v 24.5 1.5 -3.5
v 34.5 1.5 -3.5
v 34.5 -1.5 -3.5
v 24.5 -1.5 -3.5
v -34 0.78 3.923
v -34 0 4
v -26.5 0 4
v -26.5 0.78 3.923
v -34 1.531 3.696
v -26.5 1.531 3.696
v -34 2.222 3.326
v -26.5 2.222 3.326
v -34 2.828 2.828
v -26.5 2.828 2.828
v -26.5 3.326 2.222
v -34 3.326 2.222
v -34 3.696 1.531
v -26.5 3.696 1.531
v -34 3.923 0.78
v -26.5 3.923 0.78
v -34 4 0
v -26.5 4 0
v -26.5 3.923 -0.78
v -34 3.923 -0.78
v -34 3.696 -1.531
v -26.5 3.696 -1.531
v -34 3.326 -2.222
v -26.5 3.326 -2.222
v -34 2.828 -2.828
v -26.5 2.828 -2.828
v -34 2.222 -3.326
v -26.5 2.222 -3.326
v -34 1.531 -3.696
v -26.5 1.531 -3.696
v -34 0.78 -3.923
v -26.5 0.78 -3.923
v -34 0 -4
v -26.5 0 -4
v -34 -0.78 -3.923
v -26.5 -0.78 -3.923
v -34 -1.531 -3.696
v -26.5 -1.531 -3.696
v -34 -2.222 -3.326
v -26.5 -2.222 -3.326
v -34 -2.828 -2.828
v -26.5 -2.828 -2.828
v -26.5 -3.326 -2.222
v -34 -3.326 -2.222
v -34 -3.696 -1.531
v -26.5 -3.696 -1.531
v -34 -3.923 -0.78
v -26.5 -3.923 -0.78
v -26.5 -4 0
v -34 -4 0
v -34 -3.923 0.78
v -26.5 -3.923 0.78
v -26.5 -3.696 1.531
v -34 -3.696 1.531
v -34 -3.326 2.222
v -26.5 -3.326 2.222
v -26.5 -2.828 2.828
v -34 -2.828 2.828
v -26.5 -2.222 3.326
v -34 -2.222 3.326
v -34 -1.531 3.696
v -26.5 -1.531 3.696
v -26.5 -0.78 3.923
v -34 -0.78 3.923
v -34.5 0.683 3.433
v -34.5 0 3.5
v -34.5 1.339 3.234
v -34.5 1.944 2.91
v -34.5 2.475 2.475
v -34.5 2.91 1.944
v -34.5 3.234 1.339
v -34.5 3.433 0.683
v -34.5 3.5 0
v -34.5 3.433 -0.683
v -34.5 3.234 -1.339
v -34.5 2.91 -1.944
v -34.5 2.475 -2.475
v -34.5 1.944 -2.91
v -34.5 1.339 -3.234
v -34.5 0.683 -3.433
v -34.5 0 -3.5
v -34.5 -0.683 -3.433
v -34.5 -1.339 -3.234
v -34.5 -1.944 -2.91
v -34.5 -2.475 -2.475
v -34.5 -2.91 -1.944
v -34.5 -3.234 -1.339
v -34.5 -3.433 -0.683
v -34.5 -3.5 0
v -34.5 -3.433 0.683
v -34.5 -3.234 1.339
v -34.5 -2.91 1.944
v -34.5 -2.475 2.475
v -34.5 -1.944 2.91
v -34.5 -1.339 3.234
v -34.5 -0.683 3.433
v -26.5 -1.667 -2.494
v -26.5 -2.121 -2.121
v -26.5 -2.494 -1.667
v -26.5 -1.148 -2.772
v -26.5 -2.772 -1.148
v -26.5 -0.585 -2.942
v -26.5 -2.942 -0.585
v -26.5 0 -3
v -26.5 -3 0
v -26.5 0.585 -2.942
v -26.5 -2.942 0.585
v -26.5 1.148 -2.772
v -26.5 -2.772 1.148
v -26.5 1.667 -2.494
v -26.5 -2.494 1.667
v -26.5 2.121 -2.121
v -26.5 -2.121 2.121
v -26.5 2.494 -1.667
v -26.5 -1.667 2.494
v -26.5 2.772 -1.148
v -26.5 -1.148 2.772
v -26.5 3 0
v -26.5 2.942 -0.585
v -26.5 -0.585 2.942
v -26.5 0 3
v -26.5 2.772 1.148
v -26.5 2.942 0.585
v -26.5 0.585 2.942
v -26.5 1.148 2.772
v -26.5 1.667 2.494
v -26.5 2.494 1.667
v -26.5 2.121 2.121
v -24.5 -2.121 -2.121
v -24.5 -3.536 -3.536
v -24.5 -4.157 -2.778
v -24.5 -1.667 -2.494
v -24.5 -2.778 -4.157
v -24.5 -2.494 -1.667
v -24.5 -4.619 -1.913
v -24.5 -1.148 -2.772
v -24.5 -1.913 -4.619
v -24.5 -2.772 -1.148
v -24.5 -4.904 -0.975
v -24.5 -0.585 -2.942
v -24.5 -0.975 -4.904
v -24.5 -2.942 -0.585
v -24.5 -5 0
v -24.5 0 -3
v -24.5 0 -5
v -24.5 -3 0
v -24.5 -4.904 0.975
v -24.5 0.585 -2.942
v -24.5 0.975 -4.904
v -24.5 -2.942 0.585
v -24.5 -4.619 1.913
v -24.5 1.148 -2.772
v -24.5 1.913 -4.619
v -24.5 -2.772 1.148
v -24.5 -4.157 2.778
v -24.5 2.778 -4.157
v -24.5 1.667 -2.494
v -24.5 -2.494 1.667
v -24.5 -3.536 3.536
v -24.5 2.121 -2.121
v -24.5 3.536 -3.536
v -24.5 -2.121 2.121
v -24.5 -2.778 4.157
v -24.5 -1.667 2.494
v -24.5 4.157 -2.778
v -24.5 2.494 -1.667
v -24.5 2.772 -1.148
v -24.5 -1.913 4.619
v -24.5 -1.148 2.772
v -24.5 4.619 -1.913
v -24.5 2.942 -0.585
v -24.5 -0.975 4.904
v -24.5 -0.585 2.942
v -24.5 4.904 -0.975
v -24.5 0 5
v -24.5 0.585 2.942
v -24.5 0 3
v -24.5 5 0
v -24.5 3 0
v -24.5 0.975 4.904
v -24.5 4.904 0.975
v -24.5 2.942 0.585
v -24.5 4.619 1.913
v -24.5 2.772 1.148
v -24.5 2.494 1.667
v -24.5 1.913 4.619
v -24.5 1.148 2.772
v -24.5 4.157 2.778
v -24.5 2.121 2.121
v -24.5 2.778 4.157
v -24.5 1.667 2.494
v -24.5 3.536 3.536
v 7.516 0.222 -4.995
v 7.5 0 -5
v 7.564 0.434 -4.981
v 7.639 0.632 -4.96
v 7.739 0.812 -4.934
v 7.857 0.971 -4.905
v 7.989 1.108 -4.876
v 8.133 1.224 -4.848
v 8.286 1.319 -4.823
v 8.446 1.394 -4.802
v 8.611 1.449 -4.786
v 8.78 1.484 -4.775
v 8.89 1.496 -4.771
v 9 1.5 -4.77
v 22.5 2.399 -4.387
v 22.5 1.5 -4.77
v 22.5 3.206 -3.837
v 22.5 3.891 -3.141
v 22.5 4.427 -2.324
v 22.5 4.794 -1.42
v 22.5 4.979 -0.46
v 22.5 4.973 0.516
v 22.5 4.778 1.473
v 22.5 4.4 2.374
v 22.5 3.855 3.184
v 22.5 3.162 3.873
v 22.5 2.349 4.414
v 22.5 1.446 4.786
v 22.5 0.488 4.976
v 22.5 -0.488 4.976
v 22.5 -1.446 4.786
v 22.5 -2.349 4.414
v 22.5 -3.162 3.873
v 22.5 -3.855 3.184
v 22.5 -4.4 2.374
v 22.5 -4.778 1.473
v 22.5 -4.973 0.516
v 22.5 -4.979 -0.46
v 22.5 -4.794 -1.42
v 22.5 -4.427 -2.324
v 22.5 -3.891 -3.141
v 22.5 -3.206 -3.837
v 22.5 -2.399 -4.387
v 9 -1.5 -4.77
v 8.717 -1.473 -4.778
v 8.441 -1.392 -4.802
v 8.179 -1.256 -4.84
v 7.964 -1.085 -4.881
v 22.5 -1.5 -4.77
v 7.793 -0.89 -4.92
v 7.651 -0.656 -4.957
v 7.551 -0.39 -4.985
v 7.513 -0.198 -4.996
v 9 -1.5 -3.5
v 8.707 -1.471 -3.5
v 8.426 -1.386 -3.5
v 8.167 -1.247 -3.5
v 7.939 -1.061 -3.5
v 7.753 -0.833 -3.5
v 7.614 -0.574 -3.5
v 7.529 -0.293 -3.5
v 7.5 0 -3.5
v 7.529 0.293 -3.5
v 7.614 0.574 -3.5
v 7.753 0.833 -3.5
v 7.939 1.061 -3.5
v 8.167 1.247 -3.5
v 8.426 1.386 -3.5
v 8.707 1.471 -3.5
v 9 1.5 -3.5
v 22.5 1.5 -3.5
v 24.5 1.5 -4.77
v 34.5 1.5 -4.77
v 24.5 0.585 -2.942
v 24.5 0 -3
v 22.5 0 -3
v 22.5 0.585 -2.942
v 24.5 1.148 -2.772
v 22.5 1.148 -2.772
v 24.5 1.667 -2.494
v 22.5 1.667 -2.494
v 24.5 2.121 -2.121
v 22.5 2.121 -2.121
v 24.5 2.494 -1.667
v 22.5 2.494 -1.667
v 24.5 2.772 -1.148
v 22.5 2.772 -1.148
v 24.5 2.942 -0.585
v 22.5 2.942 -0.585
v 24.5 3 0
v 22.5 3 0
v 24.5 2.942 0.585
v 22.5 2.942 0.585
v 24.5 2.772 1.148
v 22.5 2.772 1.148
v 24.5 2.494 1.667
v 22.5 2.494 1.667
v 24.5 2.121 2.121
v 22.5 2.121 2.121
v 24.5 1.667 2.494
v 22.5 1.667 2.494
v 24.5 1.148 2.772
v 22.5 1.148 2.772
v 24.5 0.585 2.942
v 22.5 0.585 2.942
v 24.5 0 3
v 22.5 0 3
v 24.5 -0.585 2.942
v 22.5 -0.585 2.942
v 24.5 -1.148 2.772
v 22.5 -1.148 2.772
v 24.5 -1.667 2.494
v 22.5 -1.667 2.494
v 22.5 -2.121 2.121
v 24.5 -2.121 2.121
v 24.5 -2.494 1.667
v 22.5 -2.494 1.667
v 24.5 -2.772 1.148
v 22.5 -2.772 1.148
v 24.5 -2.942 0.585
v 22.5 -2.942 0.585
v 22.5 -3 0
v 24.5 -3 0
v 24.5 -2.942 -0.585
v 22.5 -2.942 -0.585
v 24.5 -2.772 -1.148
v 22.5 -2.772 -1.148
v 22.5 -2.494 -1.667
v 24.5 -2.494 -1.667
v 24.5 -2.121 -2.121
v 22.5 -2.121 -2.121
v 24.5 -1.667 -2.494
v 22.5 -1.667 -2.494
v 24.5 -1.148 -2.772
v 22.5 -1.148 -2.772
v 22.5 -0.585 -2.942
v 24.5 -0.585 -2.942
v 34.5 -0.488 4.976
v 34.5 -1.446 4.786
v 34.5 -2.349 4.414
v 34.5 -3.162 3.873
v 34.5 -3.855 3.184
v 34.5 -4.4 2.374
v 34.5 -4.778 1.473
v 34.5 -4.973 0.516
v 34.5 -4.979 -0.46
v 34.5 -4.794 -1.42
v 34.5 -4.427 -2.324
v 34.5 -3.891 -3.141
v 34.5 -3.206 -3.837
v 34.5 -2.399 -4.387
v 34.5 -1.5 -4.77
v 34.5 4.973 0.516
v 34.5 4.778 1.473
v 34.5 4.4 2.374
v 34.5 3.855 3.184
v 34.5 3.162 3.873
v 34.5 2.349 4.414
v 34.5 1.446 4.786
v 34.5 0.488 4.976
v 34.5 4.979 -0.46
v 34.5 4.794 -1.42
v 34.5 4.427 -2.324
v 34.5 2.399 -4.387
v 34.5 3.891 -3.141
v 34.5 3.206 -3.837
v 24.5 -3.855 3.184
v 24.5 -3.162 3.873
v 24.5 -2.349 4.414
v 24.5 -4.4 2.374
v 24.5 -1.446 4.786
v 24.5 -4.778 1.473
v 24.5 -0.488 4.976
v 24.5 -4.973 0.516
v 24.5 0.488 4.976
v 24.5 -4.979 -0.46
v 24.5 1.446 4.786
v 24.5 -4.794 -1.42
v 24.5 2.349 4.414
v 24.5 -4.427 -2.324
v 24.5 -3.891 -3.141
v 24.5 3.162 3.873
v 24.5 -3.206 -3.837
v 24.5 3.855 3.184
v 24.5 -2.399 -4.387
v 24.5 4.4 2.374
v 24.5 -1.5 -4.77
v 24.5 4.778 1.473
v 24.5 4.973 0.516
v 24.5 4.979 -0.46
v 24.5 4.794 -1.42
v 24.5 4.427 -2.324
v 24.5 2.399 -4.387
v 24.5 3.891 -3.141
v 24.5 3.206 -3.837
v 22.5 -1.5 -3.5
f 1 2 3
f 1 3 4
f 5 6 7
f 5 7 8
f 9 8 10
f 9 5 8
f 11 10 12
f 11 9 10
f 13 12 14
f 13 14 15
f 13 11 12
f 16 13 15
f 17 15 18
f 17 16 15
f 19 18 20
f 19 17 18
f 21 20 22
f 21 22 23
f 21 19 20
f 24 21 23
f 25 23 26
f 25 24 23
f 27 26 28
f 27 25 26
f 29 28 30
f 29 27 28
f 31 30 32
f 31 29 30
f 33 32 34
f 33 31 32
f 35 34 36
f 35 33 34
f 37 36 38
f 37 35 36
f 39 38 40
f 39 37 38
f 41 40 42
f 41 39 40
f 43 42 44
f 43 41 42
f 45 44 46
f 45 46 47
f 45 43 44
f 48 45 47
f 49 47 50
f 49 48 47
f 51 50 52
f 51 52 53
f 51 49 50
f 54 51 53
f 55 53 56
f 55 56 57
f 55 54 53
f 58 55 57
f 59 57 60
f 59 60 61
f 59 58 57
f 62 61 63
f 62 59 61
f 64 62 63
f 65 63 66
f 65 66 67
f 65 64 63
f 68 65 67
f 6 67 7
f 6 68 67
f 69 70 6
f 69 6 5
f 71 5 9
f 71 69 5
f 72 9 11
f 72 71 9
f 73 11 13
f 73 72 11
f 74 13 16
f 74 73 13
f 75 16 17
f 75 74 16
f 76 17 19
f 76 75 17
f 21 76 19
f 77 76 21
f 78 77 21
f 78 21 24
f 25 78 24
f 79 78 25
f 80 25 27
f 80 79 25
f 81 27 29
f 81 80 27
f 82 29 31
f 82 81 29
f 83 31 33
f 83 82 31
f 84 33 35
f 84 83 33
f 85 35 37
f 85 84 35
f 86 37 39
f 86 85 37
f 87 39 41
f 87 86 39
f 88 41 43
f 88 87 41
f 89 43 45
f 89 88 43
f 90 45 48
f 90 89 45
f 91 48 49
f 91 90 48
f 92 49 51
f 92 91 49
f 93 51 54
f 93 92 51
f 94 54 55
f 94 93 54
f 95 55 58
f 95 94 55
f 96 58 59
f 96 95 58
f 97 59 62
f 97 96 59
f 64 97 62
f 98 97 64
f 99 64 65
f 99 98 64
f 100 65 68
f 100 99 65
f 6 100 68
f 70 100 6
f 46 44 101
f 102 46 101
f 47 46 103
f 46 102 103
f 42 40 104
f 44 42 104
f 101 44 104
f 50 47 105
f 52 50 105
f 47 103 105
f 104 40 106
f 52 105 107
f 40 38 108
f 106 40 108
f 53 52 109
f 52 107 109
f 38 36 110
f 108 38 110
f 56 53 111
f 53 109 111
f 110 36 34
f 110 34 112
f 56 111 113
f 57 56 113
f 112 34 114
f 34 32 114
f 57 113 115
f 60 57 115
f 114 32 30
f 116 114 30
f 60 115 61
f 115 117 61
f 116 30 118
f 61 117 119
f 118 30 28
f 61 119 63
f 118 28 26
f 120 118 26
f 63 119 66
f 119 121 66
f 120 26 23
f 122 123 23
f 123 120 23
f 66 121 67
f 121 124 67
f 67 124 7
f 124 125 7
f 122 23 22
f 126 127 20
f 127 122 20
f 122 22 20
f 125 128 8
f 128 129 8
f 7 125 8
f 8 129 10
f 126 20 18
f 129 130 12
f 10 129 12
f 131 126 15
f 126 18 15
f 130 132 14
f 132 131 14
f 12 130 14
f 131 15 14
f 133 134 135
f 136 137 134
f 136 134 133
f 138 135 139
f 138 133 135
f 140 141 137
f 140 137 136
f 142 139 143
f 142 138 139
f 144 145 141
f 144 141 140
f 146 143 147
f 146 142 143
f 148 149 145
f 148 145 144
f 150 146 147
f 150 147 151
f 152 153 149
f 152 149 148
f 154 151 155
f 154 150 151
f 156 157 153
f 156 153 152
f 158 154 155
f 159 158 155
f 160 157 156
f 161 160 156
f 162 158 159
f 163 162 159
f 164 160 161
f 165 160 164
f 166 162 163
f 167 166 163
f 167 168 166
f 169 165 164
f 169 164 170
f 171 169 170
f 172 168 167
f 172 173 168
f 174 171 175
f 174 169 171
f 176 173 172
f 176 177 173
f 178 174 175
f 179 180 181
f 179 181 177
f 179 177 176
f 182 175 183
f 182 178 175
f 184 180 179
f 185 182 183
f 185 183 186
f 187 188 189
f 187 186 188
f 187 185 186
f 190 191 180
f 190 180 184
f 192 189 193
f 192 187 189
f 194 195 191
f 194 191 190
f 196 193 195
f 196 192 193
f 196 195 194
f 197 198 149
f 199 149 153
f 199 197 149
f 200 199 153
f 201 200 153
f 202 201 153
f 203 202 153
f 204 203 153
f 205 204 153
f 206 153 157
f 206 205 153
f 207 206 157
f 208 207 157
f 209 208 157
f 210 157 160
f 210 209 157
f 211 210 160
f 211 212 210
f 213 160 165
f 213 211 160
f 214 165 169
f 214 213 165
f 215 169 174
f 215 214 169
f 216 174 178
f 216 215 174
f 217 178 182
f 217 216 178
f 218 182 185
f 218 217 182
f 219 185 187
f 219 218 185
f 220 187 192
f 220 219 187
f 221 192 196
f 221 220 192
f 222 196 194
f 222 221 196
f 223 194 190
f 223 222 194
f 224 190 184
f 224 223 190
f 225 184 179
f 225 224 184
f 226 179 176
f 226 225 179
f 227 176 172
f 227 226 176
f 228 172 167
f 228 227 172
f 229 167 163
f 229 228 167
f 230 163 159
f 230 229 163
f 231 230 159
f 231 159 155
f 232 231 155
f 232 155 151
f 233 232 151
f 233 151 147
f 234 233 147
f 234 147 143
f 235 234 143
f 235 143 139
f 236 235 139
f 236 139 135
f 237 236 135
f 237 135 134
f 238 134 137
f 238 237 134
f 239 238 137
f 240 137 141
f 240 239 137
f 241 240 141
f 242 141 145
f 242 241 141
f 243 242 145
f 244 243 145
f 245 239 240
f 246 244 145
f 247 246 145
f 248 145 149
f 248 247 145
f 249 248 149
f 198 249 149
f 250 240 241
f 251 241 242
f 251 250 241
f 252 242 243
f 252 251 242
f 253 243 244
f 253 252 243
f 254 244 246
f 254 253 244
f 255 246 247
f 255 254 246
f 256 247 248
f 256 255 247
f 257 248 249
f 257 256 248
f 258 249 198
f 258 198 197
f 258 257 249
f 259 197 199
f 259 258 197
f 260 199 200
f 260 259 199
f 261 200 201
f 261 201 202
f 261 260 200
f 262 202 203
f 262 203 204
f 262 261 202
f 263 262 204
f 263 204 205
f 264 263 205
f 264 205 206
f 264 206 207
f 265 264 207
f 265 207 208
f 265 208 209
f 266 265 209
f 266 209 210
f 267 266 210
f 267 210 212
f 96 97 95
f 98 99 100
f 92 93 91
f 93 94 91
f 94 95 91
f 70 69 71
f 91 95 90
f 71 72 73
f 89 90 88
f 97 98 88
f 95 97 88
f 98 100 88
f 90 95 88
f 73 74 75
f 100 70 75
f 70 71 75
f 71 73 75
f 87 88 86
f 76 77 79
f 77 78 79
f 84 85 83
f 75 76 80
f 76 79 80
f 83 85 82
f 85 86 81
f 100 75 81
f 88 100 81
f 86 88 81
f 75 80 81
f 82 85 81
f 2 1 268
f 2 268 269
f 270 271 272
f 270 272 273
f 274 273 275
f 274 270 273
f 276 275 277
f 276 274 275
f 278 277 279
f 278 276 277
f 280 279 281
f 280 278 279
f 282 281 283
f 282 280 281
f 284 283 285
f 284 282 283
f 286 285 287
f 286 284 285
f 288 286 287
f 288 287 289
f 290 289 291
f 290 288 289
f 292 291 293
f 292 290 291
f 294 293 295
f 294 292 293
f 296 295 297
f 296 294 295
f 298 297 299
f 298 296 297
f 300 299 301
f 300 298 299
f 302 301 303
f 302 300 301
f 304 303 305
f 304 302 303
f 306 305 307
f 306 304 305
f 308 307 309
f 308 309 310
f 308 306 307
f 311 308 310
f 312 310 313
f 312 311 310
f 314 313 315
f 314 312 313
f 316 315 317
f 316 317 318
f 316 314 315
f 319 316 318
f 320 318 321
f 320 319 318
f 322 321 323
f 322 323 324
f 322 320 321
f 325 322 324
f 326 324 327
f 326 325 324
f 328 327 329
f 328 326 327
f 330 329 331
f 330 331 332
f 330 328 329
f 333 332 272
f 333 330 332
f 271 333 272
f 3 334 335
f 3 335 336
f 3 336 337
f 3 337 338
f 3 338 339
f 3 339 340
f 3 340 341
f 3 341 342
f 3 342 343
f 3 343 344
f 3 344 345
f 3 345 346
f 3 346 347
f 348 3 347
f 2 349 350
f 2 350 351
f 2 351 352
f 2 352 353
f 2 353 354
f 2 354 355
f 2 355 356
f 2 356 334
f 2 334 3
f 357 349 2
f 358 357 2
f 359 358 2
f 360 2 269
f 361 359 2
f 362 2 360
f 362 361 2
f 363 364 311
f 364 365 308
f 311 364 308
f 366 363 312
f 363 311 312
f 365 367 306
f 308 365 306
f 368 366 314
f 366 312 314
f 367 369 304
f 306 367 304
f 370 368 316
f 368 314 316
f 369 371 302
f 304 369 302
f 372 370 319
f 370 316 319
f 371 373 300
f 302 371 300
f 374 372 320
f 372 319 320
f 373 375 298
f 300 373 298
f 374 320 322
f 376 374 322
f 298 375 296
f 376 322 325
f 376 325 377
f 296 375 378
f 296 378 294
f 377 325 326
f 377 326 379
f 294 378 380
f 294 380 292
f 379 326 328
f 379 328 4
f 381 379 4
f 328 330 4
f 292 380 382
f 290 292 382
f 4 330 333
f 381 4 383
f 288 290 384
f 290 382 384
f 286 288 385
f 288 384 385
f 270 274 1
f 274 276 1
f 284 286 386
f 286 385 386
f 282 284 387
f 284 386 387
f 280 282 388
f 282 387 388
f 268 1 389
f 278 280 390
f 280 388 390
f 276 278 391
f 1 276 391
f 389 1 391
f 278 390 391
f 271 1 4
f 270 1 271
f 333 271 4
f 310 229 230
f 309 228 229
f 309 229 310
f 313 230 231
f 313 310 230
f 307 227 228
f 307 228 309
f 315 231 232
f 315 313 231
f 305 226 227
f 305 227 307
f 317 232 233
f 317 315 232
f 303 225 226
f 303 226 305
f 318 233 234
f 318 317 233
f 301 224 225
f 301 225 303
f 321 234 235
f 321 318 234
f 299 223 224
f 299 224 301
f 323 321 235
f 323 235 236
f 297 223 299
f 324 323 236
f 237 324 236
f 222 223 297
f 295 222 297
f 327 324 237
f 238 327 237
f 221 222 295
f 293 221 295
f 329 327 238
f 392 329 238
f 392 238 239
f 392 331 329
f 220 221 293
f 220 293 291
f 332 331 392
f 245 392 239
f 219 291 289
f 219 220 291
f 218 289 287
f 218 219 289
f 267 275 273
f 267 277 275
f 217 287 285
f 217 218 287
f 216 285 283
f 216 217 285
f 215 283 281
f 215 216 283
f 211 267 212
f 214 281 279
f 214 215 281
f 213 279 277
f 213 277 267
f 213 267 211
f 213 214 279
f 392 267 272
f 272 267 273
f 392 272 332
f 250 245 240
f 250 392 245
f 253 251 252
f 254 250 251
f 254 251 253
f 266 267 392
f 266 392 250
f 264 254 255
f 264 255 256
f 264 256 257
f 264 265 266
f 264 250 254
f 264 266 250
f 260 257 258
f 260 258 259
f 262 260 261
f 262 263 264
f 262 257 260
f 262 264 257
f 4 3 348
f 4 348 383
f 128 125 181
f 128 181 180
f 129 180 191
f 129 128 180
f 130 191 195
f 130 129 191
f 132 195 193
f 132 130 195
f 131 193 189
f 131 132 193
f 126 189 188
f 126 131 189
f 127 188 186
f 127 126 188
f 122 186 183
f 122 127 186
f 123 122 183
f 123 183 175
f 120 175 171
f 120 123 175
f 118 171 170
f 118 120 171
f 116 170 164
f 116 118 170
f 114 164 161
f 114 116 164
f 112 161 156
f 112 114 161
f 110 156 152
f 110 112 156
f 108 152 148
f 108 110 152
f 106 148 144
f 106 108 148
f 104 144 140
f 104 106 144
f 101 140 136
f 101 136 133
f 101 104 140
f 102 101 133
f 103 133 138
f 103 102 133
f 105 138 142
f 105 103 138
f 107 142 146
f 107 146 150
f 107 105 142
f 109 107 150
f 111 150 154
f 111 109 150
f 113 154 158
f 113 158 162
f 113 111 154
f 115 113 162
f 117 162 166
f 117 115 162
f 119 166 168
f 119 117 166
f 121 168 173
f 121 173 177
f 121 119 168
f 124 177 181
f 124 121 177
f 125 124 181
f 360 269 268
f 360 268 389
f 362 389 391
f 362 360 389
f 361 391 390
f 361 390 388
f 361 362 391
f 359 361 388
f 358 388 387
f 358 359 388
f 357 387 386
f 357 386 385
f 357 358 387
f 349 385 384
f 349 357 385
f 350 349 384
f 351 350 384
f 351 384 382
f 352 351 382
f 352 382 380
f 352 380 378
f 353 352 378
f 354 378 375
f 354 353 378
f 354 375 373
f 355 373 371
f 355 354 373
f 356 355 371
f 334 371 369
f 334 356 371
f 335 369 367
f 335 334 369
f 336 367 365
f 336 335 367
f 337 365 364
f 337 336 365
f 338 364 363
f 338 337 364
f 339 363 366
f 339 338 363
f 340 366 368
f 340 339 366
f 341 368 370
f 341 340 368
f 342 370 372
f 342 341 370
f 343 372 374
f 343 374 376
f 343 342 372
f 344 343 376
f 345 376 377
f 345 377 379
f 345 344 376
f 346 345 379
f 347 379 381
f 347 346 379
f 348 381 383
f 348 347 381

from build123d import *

# Parameters (mm, degrees)
SKETCH1_R           = 5
BOSS_EXTRUDE1_DEPTH = 34.5
CUT_EXTRUDE1_START  = -10
SKETCH2_R           = 5
SKETCH2_R_2         = 3
CUT_EXTRUDE1_DEPTH  = 2
CUT_EXTRUDE4_START  = -3.5
CUT_EXTRUDE4_DEPTH  = 3.2
CHAMFER1_SIZE       = 0.5
SKETCH4_OUTSIDE_W   = 26.086
SKETCH4_OUTSIDE_H   = 26.086
SKETCH4_OUTSIDE_R   = 4
CUT_EXTRUDE5_DEPTH  = 8
CHAMFER2_SIZE       = 0.5
CUT_EXTRUDE6_START  = -8
SKETCH6_OUTSIDE_W   = 26.086
SKETCH6_OUTSIDE_H   = 26.086
SKETCH6_OUTSIDE_R   = 3
CUT_EXTRUDE6_DEPTH  = 2


with BuildPart() as part:
    # Sketch1 → Boss-Extrude1 (new body, symmetric)
    with BuildSketch(Plane(origin=(0, 0, 0), x_dir=(0, 0, -1), z_dir=(1, 0, 0))):
        Circle(SKETCH1_R)
    extrude(amount=BOSS_EXTRUDE1_DEPTH, both=True)

    # Sketch2 → Cut-Extrude1 (cut)
    with BuildSketch(Plane(origin=(34.5, 0, 0), x_dir=(0, 0, -1), z_dir=(1, 0, 0)).offset(CUT_EXTRUDE1_START)):
        Circle(SKETCH2_R)
        Circle(SKETCH2_R_2, mode=Mode.SUBTRACT)
    extrude(amount=-CUT_EXTRUDE1_DEPTH, mode=Mode.SUBTRACT)

    # Sketch3 → Cut-Extrude4 (cut)
    with BuildSketch(Plane.XY.offset(CUT_EXTRUDE4_START)):
        with BuildLine():
            Line((68.42289795, -1.5), (9, -1.5))
            ThreePointArc((9, -1.5), (7.5, 0), (9, 1.5))
            Line((9, 1.5), (68.42289795, 1.5))
            Line((68.42289795, 1.5), (68.42289795, -1.5))
        make_face()
    extrude(amount=-CUT_EXTRUDE4_DEPTH, mode=Mode.SUBTRACT)

    # Chamfer1
    chamfer1_edges = [part.edges().sort_by_distance(p)[0] for p in [
        (-34.5, 0, 5),
    ]]
    chamfer(chamfer1_edges, length=CHAMFER1_SIZE)

    # Sketch4 outside → Cut-Extrude5 (cut)
    with BuildSketch(Plane.ZY.offset(34.5)):
        Rectangle(SKETCH4_OUTSIDE_W, SKETCH4_OUTSIDE_H)
        Circle(SKETCH4_OUTSIDE_R, mode=Mode.SUBTRACT)
    extrude(amount=-CUT_EXTRUDE5_DEPTH, mode=Mode.SUBTRACT)

    # Chamfer2
    chamfer2_edges = [part.edges().sort_by_distance(p)[0] for p in [
        (-34.5, 0, -4),
    ]]
    chamfer(chamfer2_edges, length=CHAMFER2_SIZE)

    # Sketch6 outside → Cut-Extrude6 (cut)
    with BuildSketch(Plane.ZY.offset(34.5).offset(CUT_EXTRUDE6_START)):
        Rectangle(SKETCH6_OUTSIDE_W, SKETCH6_OUTSIDE_H)
        Circle(SKETCH6_OUTSIDE_R, mode=Mode.SUBTRACT)
    extrude(amount=-CUT_EXTRUDE6_DEPTH, mode=Mode.SUBTRACT)


solid = part.part
